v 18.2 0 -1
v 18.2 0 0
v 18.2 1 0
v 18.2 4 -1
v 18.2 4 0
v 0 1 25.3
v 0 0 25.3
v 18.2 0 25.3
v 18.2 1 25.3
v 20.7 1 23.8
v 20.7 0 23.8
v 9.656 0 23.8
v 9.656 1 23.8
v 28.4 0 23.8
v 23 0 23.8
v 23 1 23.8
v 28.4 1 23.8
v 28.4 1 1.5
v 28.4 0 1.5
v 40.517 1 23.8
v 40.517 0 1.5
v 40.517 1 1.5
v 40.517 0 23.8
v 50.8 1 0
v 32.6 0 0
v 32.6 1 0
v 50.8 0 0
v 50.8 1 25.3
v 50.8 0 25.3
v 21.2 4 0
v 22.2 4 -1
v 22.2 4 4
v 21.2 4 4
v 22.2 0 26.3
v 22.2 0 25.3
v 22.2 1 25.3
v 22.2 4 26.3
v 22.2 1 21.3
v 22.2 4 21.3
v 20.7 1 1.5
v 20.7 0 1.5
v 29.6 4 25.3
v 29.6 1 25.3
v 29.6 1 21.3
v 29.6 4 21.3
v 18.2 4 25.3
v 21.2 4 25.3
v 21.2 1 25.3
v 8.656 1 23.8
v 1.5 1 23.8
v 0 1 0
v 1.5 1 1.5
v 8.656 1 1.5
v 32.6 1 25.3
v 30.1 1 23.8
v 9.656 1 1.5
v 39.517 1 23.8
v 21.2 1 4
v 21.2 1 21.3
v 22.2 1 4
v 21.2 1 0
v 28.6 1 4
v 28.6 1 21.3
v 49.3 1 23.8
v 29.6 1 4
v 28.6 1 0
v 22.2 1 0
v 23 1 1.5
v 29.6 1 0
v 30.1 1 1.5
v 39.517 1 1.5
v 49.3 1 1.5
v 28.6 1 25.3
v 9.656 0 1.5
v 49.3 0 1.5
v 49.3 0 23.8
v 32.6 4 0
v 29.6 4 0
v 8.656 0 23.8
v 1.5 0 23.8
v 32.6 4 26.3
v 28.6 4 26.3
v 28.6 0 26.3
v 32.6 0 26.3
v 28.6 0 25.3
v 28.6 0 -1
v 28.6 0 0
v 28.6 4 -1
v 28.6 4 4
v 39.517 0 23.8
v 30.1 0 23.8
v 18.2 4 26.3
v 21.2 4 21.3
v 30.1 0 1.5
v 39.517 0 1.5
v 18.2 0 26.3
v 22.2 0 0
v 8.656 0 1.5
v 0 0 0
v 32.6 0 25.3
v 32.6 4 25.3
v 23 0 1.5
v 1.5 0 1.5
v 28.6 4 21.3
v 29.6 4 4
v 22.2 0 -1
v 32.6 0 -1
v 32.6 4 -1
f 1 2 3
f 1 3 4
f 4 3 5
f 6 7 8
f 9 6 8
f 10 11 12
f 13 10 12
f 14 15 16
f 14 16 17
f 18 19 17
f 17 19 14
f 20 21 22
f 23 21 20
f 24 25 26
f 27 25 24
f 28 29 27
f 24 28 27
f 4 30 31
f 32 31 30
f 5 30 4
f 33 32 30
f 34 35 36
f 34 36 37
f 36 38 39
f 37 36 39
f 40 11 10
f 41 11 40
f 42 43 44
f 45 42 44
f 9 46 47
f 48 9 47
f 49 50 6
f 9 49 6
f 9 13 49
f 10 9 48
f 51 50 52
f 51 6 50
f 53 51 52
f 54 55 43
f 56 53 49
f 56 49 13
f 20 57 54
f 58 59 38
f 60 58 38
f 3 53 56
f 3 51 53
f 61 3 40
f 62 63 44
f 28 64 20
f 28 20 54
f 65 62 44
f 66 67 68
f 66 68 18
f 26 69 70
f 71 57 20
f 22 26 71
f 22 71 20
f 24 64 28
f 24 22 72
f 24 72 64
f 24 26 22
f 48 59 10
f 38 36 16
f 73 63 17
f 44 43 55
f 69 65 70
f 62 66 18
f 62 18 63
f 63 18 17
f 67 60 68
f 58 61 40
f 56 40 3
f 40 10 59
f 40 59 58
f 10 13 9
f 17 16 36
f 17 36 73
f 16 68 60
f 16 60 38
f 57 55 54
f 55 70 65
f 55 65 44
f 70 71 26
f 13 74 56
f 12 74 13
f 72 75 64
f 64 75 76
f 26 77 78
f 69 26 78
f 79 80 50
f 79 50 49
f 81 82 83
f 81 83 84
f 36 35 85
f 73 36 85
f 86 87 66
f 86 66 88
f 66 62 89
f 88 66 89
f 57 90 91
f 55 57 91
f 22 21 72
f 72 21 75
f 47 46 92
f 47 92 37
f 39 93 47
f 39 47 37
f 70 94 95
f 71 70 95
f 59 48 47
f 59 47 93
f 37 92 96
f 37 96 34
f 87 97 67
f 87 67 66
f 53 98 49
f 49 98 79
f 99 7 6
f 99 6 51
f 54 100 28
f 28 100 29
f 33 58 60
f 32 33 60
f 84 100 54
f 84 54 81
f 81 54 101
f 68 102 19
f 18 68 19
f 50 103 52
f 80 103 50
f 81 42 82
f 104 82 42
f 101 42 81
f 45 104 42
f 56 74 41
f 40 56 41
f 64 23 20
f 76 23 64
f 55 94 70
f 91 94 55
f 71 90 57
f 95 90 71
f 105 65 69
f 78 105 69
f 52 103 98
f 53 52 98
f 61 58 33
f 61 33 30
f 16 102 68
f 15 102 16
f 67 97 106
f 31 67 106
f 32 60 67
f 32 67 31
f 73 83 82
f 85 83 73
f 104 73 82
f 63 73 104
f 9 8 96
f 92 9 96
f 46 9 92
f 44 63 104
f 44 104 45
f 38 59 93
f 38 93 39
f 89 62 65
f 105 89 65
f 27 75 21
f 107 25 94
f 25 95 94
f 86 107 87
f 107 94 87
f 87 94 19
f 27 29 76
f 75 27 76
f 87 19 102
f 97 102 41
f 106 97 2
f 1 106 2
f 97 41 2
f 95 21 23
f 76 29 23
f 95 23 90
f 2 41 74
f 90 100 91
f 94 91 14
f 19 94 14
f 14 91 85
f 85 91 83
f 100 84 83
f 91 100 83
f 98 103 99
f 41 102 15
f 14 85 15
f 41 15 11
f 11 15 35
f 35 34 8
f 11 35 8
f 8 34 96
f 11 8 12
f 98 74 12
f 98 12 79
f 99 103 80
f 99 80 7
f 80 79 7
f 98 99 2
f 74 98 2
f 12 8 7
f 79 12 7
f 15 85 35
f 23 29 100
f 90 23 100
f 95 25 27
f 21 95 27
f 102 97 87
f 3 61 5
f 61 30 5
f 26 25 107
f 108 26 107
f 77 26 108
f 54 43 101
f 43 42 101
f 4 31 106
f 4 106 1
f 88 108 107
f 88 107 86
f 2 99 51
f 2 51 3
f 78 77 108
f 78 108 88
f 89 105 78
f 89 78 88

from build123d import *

# Parameters (mm, degrees)
SKETCH_1_W          = 50.8
SKETCH_1_H          = 25.3
EXTRUDE_1_DEPTH     = 1
SKETCH_3_W          = 1
SKETCH_3_H          = 4
EXTRUDE_3_DEPTH     = 3
SKETCH_4_W          = 4
SKETCH_4_H          = 4
EXTRUDE_5_DEPTH     = 1
SKETCH_5_W          = 4
SKETCH_5_H          = 4
EXTRUDE_6_DEPTH     = 1
SKETCH_6_W          = 8.783145701
SKETCH_6_H          = 22.3
SKETCH_6_W_2        = 7.155556096
SKETCH_6_W_3        = 5.4
CUT_EXTRUDE_1_DEPTH = 58.343962193


with BuildPart() as part:
    # 草图1 → 凸台-拉伸1 (new body)
    with BuildSketch(Plane(origin=(0, 0, 0), x_dir=(1, 0, 0), z_dir=(0, 1, 0))):
        with Locations((25.4, -12.65)):
            Rectangle(SKETCH_1_W, SKETCH_1_H)
    extrude(amount=EXTRUDE_1_DEPTH)

    # 草图3 → 凸台-拉伸3 (add)
    with BuildSketch(Plane(origin=(0, 1, 0), x_dir=(1, 0, 0), z_dir=(0, 1, 0))):
        with Locations((21.7, -23.3)):
            Rectangle(SKETCH_3_W, SKETCH_3_H)
        with Locations((21.7, -2)):
            Rectangle(SKETCH_3_W, SKETCH_3_H)
        with Locations((29.1, -2)):
            Rectangle(SKETCH_3_W, SKETCH_3_H)
        with Locations((29.1, -23.3)):
            Rectangle(SKETCH_3_W, SKETCH_3_H)
    extrude(amount=EXTRUDE_3_DEPTH)

    # 草图4 → 凸台-拉伸5 (add)
    with BuildSketch(Plane.XY.offset(25.3)):
        with Locations((20.2, 2)):
            Rectangle(SKETCH_4_W, SKETCH_4_H)
        with Locations((30.6, 2)):
            Rectangle(SKETCH_4_W, SKETCH_4_H)
    extrude(amount=EXTRUDE_5_DEPTH)

    # 草图5 → 凸台-拉伸6 (add)
    with BuildSketch(Plane(origin=(0, 0, 0), x_dir=(-1, 0, 0), z_dir=(0, 0, -1))):
        with Locations((-20.2, 2)):
            Rectangle(SKETCH_5_W, SKETCH_5_H)
        with Locations((-30.6, 2)):
            Rectangle(SKETCH_5_W, SKETCH_5_H)
    extrude(amount=EXTRUDE_6_DEPTH)

    # 草图6 → 切除-拉伸1 (cut, through all)
    with BuildSketch(Plane.XZ):
        Polygon((20.7, 1.5), (19.7, 1.5), (9.655556096, 1.5), (9.655556096, 23.8), (19.7, 23.8), (20.7, 23.8), align=None)
        Polygon((30.1, 23.8), (31.1, 23.8), (39.516854299, 23.8), (39.516854299, 1.5), (31.1, 1.5), (30.1, 1.5), align=None)
        with Locations((44.908427149, 12.65)):
            Rectangle(SKETCH_6_W, SKETCH_6_H)
        with Locations((5.077778048, 12.65)):
            Rectangle(SKETCH_6_W_2, SKETCH_6_H)
        with Locations((25.7, 12.65)):
            Rectangle(SKETCH_6_W_3, SKETCH_6_H)
    extrude(amount=-CUT_EXTRUDE_1_DEPTH, mode=Mode.SUBTRACT)


solid = part.part
